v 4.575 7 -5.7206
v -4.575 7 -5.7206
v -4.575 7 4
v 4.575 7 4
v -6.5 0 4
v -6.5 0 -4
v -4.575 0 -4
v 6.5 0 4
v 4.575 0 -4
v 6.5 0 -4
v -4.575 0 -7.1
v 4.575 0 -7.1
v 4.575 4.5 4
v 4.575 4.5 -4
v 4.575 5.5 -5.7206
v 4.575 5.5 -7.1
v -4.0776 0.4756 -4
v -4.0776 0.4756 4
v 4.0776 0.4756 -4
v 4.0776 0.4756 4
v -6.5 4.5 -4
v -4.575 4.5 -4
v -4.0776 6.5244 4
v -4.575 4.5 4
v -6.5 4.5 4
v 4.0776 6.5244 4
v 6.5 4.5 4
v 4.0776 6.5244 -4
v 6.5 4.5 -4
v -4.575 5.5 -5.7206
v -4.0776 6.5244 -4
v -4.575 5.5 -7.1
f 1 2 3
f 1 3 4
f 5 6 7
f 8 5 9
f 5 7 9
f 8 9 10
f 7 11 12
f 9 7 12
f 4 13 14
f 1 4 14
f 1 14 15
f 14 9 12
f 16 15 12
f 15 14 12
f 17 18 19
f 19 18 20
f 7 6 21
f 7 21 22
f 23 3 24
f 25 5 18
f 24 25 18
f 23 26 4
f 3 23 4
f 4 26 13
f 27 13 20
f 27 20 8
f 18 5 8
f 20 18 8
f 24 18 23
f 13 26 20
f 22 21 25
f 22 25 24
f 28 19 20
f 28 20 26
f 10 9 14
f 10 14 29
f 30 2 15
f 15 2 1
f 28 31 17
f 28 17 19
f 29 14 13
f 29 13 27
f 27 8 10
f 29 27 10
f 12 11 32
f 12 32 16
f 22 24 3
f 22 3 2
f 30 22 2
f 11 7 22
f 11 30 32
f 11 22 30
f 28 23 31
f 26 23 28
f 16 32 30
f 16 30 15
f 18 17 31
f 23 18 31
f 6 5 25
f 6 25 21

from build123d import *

# Parameters (mm, degrees)
SKETCH1_W           = 9.15
SKETCH1_H           = 3.1
SKETCH1_W_2         = 13
SKETCH1_H_2         = 8
BOSS_EXTRUDE1_DEPTH = 7
SKETCH2_W           = 1.925
SKETCH2_H           = 8
CUT_EXTRUDE1_DEPTH  = 2.5
SKETCH3_W           = 9.15
SKETCH3_H           = 1.379434604
CUT_EXTRUDE2_DEPTH  = 1.5
SKETCH4_W           = 8.155225922
SKETCH4_H           = 6.048851008
CUT_EXTRUDE3_DEPTH  = 8


with BuildPart() as part:
    # Sketch1 → Boss-Extrude1 (new body)
    with BuildSketch(Plane(origin=(0, 0, 0), x_dir=(1, 0, 0), z_dir=(0, 1, 0))):
        with Locations((0, 5.55)):
            Rectangle(SKETCH1_W, SKETCH1_H)
        Rectangle(SKETCH1_W_2, SKETCH1_H_2)
    extrude(amount=BOSS_EXTRUDE1_DEPTH)

    # Sketch2 → Cut-Extrude1 (cut)
    with BuildSketch(Plane(origin=(0, 7, 0), x_dir=(1, 0, 0), z_dir=(0, 1, 0))):
        with Locations((-5.5375, 0)):
            Rectangle(SKETCH2_W, SKETCH2_H)
        with Locations((5.5375, 0)):
            Rectangle(SKETCH2_W, SKETCH2_H)
    extrude(amount=-CUT_EXTRUDE1_DEPTH, mode=Mode.SUBTRACT)

    # Sketch3 → Cut-Extrude2 (cut)
    with BuildSketch(Plane(origin=(0, 7, 0), x_dir=(1, 0, 0), z_dir=(0, 1, 0))):
        with Locations((0, 6.410282698)):
            Rectangle(SKETCH3_W, SKETCH3_H)
    extrude(amount=-CUT_EXTRUDE2_DEPTH, mode=Mode.SUBTRACT)

    # Sketch4 → Cut-Extrude3 (cut)
    with BuildSketch(Plane.XY.offset(4)):
        with Locations((0, 3.5)):
            Rectangle(SKETCH4_W, SKETCH4_H)
    extrude(amount=-CUT_EXTRUDE3_DEPTH, mode=Mode.SUBTRACT)


solid = part.part
